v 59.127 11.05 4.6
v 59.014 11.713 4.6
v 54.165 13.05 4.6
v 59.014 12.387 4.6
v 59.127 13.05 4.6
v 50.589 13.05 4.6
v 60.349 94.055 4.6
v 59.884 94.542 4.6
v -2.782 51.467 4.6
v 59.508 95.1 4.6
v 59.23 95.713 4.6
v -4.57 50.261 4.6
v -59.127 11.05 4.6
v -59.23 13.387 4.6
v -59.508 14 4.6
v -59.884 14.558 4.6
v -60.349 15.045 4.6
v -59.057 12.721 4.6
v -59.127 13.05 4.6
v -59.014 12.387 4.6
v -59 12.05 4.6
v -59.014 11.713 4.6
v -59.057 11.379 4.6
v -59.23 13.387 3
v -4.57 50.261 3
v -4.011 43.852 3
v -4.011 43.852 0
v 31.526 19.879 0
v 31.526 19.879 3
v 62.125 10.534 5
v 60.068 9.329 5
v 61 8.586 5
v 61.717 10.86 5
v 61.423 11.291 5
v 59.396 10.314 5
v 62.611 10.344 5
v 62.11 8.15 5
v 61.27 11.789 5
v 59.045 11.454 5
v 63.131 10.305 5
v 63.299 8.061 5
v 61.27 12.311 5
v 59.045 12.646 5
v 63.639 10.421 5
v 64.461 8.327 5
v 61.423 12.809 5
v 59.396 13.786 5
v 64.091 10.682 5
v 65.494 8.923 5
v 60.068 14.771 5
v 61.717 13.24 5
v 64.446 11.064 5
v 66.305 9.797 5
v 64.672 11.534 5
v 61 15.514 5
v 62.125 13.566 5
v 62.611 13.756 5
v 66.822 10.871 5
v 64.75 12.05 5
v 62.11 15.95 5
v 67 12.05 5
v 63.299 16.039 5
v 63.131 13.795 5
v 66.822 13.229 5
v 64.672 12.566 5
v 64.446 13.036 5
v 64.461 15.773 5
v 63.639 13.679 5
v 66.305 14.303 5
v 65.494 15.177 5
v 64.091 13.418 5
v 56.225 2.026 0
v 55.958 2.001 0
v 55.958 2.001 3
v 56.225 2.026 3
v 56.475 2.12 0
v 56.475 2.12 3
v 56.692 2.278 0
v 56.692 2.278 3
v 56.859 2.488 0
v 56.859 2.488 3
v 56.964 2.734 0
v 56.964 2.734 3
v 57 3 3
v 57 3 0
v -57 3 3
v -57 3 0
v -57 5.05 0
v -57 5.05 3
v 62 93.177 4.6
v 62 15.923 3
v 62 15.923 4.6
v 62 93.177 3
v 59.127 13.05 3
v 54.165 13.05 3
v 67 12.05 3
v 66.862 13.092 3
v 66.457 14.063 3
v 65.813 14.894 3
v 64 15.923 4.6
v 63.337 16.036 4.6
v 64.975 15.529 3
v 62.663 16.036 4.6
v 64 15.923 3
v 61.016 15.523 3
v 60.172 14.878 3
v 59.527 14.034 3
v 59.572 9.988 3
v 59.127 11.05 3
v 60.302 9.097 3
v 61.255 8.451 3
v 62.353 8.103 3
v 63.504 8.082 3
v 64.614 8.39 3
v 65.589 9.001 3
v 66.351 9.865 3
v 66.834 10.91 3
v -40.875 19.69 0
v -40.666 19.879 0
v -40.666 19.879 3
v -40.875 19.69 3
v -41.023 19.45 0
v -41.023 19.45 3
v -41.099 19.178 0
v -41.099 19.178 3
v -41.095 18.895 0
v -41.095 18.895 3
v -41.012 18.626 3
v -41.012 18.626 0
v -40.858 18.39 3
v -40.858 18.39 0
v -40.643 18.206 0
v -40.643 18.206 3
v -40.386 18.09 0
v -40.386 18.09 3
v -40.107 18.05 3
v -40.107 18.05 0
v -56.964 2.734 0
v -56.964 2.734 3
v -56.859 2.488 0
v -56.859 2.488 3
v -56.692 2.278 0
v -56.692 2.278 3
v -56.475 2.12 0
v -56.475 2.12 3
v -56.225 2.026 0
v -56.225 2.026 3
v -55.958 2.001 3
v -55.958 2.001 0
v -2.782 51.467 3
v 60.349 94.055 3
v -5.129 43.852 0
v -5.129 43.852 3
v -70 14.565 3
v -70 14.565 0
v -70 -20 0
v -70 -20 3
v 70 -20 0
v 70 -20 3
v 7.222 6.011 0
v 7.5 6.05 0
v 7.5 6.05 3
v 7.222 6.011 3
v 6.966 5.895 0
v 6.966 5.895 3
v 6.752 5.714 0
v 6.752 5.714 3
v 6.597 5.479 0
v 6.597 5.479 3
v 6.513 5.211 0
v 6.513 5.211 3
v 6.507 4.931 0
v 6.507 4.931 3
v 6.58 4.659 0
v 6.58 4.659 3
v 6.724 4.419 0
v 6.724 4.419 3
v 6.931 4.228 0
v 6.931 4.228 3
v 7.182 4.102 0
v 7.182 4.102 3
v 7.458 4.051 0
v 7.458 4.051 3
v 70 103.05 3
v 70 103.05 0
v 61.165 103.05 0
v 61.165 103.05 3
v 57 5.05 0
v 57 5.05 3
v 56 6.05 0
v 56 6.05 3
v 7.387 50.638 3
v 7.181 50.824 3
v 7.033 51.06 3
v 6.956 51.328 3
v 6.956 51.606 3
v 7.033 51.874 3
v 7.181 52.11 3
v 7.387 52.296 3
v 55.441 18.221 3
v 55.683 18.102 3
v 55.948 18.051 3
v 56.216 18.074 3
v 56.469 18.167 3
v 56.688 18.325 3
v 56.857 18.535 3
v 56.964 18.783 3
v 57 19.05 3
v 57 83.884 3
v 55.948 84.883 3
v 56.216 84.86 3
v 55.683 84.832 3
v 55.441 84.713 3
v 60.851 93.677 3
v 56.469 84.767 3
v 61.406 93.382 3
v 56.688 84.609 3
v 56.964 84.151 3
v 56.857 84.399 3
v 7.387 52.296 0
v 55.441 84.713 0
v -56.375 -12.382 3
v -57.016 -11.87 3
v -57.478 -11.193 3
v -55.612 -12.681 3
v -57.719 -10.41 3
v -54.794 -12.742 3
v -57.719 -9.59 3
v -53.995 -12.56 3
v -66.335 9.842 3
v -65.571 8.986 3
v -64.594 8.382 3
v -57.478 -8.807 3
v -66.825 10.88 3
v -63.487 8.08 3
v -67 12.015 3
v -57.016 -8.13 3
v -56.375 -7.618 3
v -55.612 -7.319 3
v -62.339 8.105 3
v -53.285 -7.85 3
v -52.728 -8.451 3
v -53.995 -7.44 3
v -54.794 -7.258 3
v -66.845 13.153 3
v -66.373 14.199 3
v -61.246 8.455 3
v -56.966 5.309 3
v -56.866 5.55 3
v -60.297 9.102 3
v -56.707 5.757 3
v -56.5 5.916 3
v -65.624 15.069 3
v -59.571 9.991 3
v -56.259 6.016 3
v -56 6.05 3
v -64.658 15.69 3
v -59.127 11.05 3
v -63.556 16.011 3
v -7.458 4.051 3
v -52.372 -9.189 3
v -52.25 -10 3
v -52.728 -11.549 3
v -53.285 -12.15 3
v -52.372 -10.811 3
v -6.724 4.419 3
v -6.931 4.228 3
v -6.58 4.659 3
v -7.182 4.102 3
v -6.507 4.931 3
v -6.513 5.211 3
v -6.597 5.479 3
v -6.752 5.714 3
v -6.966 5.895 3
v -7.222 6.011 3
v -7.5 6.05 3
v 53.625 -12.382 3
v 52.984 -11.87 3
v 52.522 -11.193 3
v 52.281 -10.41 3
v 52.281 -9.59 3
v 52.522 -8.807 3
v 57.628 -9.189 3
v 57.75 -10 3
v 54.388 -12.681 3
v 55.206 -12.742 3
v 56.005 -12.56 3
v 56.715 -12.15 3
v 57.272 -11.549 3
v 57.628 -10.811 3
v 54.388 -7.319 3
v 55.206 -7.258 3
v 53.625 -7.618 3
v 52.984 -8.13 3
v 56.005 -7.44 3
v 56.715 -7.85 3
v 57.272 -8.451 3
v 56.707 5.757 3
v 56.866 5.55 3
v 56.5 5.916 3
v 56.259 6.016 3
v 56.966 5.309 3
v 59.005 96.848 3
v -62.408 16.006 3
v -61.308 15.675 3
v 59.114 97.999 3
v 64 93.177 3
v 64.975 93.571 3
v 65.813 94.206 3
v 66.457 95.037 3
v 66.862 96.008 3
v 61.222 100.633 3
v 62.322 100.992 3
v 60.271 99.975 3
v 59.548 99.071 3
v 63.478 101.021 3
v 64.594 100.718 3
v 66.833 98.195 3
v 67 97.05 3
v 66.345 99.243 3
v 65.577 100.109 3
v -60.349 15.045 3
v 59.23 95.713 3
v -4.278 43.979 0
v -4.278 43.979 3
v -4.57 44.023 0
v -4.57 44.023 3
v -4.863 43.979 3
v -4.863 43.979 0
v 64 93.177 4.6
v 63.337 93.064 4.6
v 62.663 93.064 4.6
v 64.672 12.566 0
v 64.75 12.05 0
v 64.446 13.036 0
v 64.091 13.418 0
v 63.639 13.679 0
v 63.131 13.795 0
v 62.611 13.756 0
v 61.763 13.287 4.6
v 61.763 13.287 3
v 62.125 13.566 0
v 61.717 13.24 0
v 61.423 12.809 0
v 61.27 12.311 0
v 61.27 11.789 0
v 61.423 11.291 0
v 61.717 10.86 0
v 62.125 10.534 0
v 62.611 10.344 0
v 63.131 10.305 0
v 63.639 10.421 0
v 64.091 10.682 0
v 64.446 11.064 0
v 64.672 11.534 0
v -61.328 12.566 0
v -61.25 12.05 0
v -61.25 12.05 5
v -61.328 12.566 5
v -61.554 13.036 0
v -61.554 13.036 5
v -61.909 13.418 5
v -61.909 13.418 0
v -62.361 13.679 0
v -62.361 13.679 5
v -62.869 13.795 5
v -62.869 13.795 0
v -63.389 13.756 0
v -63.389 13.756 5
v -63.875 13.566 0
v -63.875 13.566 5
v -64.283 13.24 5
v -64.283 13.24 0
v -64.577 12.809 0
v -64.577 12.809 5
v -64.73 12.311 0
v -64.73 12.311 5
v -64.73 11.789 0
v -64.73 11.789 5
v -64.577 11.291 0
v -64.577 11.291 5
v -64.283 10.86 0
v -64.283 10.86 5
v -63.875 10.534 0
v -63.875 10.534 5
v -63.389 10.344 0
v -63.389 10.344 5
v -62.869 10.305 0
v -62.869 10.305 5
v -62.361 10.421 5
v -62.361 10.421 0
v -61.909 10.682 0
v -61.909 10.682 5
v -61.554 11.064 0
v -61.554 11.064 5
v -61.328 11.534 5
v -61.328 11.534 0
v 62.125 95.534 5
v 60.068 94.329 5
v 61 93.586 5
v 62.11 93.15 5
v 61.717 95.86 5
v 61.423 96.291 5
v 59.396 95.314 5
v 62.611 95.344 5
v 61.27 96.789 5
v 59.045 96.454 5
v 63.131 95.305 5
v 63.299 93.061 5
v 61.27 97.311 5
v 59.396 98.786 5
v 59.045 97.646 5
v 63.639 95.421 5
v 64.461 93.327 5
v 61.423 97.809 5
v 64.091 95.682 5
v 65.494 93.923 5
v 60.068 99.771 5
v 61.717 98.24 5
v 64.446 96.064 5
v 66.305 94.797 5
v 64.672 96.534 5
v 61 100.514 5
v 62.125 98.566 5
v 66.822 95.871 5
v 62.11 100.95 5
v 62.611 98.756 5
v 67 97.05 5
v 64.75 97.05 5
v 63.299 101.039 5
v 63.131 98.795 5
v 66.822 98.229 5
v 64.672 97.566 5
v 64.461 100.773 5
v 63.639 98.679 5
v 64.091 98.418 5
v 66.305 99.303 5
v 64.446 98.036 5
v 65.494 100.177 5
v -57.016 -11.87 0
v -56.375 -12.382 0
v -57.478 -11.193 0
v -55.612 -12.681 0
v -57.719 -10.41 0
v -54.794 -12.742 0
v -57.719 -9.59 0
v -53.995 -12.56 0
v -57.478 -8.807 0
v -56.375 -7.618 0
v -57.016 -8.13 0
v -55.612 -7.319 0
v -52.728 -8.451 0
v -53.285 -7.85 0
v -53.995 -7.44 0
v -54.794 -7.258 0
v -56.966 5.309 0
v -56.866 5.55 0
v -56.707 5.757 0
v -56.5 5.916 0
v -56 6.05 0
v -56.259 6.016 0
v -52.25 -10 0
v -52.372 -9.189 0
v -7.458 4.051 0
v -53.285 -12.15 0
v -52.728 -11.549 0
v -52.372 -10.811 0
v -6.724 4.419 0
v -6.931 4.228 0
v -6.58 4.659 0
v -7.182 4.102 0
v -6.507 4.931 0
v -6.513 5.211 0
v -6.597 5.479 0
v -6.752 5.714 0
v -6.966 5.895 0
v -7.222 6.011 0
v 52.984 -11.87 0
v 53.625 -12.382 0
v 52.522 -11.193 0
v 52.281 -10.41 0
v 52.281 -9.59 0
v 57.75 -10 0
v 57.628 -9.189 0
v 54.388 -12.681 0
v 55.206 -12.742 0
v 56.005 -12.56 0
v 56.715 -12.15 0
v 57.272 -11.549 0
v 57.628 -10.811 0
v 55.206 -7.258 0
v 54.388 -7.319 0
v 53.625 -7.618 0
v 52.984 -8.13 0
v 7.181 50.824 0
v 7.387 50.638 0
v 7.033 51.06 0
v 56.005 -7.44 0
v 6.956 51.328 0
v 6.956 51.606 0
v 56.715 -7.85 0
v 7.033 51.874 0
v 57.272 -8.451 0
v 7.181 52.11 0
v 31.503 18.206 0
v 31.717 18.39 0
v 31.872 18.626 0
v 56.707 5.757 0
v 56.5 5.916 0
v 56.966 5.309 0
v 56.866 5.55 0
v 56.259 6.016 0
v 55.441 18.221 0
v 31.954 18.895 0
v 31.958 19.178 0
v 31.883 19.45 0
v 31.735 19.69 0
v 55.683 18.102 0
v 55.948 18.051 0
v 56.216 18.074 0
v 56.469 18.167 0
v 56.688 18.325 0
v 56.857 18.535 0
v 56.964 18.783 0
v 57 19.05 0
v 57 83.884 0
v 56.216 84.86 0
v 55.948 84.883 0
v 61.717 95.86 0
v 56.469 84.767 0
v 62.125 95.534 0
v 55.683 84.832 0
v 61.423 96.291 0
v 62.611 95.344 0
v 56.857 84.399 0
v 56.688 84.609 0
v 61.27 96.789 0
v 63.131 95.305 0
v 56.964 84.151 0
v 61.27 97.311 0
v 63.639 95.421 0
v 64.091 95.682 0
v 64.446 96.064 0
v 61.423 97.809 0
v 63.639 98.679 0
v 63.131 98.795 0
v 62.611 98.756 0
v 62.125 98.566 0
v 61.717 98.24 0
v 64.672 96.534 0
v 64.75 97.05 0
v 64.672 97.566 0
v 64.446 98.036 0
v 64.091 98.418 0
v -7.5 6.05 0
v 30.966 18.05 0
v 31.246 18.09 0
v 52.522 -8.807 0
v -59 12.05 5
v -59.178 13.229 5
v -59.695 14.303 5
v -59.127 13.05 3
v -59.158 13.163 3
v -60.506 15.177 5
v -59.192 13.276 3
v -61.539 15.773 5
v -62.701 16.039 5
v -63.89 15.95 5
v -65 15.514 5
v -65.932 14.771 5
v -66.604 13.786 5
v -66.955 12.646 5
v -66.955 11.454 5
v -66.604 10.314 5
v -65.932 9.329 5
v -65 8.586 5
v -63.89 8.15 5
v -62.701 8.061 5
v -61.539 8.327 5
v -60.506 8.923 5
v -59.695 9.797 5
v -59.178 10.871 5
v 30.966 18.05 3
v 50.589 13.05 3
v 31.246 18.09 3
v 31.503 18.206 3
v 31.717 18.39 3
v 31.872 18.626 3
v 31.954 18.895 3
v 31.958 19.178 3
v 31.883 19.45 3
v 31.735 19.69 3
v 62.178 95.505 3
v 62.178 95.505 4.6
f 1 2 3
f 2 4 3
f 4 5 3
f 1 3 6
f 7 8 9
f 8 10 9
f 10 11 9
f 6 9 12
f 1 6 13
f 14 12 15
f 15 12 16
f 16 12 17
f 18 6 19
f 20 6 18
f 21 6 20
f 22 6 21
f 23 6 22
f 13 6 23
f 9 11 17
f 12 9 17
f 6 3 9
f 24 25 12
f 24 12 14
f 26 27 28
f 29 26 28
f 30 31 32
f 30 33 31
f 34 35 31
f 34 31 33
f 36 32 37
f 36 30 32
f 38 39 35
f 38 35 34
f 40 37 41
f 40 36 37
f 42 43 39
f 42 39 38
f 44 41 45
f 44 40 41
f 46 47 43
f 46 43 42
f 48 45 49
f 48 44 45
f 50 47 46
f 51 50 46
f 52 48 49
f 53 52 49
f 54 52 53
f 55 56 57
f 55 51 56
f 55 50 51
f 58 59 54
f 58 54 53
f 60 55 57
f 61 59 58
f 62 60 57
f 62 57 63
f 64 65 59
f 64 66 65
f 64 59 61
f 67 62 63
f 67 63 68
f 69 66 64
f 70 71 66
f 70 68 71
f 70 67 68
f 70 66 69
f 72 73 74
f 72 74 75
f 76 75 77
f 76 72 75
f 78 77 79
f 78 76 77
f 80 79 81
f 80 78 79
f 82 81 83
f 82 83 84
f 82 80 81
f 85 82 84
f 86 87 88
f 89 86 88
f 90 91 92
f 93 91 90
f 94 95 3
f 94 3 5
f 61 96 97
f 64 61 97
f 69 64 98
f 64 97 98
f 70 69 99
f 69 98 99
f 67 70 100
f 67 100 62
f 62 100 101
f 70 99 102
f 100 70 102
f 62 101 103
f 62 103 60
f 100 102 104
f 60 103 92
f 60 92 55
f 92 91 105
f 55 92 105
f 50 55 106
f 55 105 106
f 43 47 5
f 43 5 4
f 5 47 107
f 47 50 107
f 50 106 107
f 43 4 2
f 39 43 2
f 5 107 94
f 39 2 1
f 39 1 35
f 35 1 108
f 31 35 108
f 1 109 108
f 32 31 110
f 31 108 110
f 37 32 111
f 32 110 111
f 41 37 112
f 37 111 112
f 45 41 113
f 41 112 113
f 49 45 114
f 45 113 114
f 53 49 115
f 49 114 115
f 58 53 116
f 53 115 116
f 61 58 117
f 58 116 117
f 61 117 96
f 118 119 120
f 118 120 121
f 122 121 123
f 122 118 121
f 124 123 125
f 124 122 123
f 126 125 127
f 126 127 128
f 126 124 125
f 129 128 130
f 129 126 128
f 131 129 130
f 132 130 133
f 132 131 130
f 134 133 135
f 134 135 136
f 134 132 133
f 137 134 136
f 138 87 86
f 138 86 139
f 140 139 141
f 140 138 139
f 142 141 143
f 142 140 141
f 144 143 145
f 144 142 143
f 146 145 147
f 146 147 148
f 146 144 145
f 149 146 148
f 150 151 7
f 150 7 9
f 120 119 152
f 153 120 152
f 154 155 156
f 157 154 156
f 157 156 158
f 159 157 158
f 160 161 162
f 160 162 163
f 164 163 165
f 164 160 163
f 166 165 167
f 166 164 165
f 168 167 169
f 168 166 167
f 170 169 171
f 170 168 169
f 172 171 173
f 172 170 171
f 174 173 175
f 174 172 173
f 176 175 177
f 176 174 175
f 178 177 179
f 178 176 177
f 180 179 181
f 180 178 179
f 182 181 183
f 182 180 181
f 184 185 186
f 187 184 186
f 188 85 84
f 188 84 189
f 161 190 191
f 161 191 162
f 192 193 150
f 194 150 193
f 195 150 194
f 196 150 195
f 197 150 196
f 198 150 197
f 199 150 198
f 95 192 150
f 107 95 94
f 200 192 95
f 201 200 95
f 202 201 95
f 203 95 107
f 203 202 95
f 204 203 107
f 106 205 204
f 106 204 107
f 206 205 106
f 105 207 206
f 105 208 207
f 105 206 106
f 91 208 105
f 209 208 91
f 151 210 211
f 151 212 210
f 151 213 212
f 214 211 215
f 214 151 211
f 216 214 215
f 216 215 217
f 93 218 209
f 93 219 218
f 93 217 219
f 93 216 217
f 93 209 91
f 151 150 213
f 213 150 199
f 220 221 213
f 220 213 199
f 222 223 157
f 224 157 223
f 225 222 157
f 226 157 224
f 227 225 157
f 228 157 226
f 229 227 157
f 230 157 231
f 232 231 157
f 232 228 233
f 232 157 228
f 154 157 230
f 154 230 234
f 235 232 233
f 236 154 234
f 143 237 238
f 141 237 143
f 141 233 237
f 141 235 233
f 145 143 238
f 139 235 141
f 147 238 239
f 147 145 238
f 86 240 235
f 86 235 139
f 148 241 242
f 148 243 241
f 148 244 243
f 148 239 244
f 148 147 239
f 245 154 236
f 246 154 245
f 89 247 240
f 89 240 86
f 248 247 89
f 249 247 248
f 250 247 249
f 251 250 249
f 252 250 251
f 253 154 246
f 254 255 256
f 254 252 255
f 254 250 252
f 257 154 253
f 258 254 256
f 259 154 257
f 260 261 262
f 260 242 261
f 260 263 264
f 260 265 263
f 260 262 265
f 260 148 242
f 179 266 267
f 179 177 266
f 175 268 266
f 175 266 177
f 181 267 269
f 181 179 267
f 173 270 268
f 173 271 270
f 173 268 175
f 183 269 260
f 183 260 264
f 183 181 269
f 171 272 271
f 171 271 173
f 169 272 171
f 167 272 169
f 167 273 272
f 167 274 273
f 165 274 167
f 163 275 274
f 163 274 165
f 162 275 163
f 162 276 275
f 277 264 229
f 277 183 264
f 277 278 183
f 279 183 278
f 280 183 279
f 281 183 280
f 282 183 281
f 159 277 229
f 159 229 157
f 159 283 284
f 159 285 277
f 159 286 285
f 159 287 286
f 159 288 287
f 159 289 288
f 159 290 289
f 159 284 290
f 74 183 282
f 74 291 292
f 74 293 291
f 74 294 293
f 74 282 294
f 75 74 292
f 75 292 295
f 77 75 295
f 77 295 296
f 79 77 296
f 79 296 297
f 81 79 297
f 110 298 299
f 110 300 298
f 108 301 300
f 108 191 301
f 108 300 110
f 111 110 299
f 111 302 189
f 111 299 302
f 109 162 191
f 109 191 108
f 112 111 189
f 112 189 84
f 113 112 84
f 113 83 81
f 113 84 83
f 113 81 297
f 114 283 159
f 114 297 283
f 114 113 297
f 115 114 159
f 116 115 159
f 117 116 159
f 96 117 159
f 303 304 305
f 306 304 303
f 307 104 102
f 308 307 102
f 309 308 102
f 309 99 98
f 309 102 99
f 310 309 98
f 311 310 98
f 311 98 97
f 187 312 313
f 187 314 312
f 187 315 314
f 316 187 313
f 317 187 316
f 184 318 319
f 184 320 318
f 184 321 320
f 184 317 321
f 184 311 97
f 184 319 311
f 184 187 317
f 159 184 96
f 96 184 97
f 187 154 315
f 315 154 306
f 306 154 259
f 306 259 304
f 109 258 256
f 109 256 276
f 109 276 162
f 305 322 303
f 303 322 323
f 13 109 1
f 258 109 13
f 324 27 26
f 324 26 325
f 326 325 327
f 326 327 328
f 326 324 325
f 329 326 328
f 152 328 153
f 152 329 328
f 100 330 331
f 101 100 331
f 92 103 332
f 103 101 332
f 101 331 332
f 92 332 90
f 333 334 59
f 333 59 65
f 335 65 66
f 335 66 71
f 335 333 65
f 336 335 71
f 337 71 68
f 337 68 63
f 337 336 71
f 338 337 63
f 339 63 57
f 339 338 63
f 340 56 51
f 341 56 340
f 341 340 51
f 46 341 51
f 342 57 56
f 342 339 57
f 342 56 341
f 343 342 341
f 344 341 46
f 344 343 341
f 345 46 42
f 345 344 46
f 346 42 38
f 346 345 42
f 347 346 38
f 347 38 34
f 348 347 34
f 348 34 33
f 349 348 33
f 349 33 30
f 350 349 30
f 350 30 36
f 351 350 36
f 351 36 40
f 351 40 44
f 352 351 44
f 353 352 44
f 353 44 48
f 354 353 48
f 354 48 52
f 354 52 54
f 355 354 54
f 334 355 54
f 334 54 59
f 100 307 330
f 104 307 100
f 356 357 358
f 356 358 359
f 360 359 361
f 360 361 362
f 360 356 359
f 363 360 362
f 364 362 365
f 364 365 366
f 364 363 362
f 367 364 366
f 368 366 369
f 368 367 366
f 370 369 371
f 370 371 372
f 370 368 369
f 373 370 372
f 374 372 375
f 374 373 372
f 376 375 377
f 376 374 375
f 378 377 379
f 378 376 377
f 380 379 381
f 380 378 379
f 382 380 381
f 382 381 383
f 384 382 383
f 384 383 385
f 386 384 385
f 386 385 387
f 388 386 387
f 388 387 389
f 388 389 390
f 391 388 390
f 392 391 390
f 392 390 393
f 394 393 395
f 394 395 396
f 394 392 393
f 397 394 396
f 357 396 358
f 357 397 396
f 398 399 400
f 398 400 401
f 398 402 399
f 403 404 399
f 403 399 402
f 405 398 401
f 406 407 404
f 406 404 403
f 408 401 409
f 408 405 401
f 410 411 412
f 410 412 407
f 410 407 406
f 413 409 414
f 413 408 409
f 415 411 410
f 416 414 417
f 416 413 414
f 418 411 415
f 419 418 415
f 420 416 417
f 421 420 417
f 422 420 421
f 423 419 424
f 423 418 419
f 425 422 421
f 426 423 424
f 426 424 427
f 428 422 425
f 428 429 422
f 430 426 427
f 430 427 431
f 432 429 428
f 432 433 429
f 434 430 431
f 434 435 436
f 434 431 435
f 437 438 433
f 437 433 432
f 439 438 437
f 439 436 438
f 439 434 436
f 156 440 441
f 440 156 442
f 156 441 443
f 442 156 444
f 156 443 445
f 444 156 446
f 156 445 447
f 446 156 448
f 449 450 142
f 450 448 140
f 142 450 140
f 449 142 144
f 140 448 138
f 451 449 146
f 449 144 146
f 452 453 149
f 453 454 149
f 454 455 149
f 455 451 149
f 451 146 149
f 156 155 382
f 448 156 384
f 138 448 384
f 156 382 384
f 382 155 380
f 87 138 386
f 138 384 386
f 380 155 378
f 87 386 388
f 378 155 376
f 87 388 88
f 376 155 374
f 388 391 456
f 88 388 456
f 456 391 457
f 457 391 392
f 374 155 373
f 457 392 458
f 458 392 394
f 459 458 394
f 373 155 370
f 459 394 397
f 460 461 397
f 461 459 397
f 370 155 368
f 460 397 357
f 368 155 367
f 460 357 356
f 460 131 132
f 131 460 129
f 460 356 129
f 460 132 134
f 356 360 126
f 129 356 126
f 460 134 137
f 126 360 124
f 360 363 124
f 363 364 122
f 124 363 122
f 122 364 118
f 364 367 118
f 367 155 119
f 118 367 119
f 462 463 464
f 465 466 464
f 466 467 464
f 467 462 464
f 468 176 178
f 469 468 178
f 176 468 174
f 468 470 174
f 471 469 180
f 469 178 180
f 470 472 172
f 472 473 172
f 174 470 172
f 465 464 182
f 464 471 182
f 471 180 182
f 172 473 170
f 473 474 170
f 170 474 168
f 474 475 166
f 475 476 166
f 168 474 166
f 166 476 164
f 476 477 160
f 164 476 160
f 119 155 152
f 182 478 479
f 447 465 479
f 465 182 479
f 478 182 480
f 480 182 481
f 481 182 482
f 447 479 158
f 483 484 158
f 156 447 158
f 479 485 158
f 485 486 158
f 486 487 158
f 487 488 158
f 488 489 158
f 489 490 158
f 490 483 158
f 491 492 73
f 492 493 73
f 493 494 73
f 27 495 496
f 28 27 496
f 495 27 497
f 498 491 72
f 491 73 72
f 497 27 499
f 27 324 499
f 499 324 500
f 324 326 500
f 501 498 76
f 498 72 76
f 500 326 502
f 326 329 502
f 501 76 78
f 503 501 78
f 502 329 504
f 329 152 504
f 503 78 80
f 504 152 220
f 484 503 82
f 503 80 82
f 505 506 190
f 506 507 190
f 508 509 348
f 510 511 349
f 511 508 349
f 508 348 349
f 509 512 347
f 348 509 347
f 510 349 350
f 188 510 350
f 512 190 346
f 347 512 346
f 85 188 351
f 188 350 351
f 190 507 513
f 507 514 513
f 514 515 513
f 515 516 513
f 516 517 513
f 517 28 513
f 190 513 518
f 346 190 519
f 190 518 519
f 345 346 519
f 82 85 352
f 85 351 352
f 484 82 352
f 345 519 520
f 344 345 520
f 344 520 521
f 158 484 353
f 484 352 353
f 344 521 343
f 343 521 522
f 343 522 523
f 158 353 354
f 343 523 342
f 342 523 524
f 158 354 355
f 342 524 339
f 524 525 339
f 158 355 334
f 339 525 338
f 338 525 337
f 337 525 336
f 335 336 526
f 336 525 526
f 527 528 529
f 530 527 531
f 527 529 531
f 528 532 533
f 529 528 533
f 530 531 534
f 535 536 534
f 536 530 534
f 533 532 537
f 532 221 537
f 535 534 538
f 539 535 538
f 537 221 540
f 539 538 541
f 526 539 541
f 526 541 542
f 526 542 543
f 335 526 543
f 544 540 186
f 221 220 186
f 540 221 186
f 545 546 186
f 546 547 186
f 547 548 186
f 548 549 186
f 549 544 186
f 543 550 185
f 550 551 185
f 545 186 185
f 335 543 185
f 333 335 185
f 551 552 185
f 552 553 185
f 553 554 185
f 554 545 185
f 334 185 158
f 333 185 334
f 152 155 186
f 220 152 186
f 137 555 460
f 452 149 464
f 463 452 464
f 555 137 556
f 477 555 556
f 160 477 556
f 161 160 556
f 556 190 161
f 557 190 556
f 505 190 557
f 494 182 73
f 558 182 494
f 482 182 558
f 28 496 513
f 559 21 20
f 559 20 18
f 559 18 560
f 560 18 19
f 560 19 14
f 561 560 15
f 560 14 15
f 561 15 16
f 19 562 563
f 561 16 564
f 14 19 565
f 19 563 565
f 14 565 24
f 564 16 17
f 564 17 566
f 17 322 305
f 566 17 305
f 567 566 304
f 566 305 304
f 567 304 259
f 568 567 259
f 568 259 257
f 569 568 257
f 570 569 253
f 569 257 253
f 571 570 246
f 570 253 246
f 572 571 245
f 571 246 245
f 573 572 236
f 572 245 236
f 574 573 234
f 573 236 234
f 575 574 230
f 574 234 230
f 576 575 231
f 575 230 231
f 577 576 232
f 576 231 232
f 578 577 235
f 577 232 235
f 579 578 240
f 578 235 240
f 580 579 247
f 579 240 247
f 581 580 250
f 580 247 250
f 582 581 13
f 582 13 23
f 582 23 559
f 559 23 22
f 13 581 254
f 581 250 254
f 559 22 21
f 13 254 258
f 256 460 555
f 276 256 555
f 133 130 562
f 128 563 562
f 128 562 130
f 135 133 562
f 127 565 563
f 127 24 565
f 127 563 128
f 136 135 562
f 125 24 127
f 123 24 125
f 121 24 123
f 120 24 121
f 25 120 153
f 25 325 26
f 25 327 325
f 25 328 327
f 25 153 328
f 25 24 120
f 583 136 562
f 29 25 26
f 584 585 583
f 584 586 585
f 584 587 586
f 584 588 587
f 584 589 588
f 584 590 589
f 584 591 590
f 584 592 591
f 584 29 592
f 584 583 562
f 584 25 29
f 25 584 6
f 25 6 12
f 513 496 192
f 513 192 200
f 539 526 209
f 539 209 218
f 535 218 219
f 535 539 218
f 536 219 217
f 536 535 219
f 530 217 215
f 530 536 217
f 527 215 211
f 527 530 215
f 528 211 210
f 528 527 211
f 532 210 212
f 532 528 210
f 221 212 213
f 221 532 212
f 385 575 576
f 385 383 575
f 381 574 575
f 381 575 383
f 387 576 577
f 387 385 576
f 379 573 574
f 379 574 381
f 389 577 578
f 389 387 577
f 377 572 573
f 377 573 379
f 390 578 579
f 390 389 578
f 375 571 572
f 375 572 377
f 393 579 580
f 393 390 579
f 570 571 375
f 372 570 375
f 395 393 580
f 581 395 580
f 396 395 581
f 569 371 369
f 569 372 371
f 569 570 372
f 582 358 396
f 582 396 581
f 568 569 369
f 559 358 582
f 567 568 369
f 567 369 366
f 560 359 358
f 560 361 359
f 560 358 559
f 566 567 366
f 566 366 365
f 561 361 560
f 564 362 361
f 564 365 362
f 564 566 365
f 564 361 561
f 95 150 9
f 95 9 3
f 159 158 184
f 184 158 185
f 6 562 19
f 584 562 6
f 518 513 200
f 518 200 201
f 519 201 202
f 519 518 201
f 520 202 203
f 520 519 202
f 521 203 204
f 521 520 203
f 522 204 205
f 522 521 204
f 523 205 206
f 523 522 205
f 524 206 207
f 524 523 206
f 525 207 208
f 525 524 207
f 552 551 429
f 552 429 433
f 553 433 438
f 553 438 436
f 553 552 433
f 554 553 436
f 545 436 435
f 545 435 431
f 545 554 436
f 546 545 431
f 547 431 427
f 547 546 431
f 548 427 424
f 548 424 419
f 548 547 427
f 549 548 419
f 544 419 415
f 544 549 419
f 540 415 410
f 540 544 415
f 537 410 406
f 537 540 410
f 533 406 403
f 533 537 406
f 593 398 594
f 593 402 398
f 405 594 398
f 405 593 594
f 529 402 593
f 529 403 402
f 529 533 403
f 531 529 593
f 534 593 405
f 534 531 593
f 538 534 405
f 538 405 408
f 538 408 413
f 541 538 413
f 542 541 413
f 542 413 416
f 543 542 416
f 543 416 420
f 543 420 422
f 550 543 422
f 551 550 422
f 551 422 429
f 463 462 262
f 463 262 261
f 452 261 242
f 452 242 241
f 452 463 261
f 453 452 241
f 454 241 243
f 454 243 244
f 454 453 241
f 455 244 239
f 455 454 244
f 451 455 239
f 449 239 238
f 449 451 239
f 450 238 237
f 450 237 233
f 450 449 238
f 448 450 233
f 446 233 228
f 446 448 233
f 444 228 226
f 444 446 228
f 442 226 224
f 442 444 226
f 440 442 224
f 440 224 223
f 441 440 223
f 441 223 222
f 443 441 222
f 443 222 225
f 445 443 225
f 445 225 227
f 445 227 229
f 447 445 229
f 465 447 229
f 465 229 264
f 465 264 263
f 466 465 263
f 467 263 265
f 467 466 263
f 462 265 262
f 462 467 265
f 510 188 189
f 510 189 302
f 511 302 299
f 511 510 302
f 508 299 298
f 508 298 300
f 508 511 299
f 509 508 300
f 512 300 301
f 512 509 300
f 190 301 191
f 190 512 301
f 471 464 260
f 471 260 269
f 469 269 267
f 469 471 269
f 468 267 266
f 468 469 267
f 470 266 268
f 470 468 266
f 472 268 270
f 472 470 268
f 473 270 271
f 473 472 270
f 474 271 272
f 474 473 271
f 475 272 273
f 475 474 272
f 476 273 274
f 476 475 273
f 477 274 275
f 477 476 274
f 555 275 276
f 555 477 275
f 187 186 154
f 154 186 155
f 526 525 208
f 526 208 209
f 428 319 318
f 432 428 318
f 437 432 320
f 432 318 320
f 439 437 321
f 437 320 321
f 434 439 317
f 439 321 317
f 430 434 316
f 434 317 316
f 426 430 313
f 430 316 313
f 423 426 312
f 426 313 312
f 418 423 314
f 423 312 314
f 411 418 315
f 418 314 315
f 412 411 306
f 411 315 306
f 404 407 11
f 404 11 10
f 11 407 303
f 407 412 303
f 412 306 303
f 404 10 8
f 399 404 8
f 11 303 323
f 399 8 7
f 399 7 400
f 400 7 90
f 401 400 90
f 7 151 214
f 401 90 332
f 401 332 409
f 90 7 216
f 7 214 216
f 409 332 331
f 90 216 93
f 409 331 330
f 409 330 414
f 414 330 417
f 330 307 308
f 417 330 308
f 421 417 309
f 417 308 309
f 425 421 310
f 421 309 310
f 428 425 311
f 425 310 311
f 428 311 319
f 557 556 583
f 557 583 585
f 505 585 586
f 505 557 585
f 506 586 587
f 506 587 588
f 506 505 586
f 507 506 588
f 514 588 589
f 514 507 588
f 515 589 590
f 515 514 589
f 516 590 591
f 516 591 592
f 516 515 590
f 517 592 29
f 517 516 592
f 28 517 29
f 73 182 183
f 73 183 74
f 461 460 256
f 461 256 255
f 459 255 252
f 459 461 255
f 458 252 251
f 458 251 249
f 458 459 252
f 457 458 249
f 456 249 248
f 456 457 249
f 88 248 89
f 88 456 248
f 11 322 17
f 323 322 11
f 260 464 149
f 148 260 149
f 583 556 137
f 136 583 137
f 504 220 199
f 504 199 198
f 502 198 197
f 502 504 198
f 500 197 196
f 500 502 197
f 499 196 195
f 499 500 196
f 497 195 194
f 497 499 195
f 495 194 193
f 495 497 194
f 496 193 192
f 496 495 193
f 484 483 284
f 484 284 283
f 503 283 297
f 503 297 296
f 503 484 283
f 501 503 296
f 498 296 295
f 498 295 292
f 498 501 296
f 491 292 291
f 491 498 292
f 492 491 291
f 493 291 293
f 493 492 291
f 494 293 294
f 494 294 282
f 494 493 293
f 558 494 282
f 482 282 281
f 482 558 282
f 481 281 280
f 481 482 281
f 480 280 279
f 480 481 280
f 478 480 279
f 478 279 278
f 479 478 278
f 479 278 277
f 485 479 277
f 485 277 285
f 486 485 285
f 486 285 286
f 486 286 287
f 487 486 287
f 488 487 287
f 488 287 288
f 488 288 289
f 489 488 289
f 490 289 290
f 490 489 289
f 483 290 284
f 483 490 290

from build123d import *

# Parameters (mm, degrees)
SKETCH_R      = 1.75
SKETCH_R_2    = 2.75
PAD_DEPTH     = 3
SKETCH001_R   = 4
SKETCH001_R_2 = 1.75
PAD001_DEPTH  = 2
PAD002_DEPTH  = 1.6


with BuildPart() as part:
    # Sketch → Pad (new body)
    with BuildSketch(Plane.XY):
        Polygon((-70, 14.565403), (-70, -20), (70, -20), (70, 103.05), (61.165402, 103.05), align=None)
        with Locations((-63, 12.05)):
            Circle(SKETCH_R, mode=Mode.SUBTRACT)
        with Locations((-55, -10)):
            Circle(SKETCH_R_2, mode=Mode.SUBTRACT)
        with Locations((55, -10)):
            Circle(SKETCH_R_2, mode=Mode.SUBTRACT)
        with Locations((63, 12.05)):
            Circle(SKETCH_R, mode=Mode.SUBTRACT)
        with Locations((63, 97.05)):
            Circle(SKETCH_R, mode=Mode.SUBTRACT)
        with BuildLine():
            Line((-56, 6.05), (-7.5, 6.05))
            ThreePointArc((-7.45777, 4.050892), (-6.500223, 5.07112), (-7.5, 6.05))
            Line((-7.45777, 4.050892), (-55.95777, 2.000892))
            ThreePointArc((-57, 3), (-56.692015, 2.278117), (-55.95777, 2.000892))
            Line((-57, 3), (-57, 5.05))
            ThreePointArc((-56, 6.05), (-56.707107, 5.757107), (-57, 5.05))
        make_face(mode=Mode.SUBTRACT)
        with BuildLine():
            Line((56, 6.05), (7.5, 6.05))
            ThreePointArc((7.5, 6.05), (6.500223, 5.07112), (7.45777, 4.050892))
            Line((7.45777, 4.050892), (55.95777, 2.000892))
            ThreePointArc((55.95777, 2.000892), (56.692015, 2.278117), (57, 3))
            Line((57, 3), (57, 5.05))
            ThreePointArc((57, 5.05), (56.707107, 5.757107), (56, 6.05))
        make_face(mode=Mode.SUBTRACT)
        with BuildLine():
            Line((55.440753, 84.712883), (7.387406, 52.295942))
            ThreePointArc((7.387406, 52.295942), (6.946652, 51.466941), (7.387406, 50.63794))
            Line((7.387406, 50.63794), (55.440753, 18.220999))
            ThreePointArc((55.440753, 18.220999), (56.469443, 18.167037), (57, 19.05))
            Line((57, 19.05), (57, 83.883882))
            ThreePointArc((57, 83.883882), (56.469443, 84.766844), (55.440753, 84.712883))
        make_face(mode=Mode.SUBTRACT)
        with BuildLine():
            Line((-40.665942, 19.879001), (-5.129429, 43.852046))
            ThreePointArc((-4.010935, 43.852046), (-4.570182, 44.023045), (-5.129429, 43.852046))
            Line((-4.010935, 43.852046), (31.525578, 19.879001))
            ThreePointArc((30.966331, 18.05), (31.922627, 18.757597), (31.525578, 19.879001))
            Line((30.966331, 18.05), (-40.106695, 18.05))
            ThreePointArc((-40.665942, 19.879001), (-41.06299, 18.757597), (-40.106695, 18.05))
        make_face(mode=Mode.SUBTRACT)
    extrude(amount=PAD_DEPTH)

    # Sketch001 → Pad001 (join)
    with BuildSketch(Plane.XY.offset(3)):
        with Locations((-63, 12.05)):
            Circle(SKETCH001_R)
        with Locations((-63, 12.05)):
            Circle(SKETCH001_R_2, mode=Mode.SUBTRACT)
        with Locations((63, 12.05)):
            Circle(SKETCH001_R)
        with Locations((63, 12.05)):
            Circle(SKETCH001_R_2, mode=Mode.SUBTRACT)
        with Locations((63, 97.05)):
            Circle(SKETCH001_R)
        with Locations((63, 97.05)):
            Circle(SKETCH001_R_2, mode=Mode.SUBTRACT)
    extrude(amount=PAD001_DEPTH)

    # Sketch002 → Pad002 (join)
    with BuildSketch(Plane.XY.offset(3)):
        Polygon((64, 94.536369), (64, 15.524874), (59.525126, 11.05), (-60.864255, 11.05), (-61.788712, 14.07341), (60.35695, 96.473261), align=None)
        Polygon((60.348539, 94.055045), (-2.782063, 51.466941), (54.165402, 13.05), (59.127017, 13.05), (62, 15.922983), (62, 93.177017), align=None, mode=Mode.SUBTRACT)
        Polygon((-4.570182, 50.26067), (-59.230045, 13.386952), (-59.127017, 13.05), (50.589164, 13.05), align=None, mode=Mode.SUBTRACT)
    extrude(amount=PAD002_DEPTH)


solid = part.part
